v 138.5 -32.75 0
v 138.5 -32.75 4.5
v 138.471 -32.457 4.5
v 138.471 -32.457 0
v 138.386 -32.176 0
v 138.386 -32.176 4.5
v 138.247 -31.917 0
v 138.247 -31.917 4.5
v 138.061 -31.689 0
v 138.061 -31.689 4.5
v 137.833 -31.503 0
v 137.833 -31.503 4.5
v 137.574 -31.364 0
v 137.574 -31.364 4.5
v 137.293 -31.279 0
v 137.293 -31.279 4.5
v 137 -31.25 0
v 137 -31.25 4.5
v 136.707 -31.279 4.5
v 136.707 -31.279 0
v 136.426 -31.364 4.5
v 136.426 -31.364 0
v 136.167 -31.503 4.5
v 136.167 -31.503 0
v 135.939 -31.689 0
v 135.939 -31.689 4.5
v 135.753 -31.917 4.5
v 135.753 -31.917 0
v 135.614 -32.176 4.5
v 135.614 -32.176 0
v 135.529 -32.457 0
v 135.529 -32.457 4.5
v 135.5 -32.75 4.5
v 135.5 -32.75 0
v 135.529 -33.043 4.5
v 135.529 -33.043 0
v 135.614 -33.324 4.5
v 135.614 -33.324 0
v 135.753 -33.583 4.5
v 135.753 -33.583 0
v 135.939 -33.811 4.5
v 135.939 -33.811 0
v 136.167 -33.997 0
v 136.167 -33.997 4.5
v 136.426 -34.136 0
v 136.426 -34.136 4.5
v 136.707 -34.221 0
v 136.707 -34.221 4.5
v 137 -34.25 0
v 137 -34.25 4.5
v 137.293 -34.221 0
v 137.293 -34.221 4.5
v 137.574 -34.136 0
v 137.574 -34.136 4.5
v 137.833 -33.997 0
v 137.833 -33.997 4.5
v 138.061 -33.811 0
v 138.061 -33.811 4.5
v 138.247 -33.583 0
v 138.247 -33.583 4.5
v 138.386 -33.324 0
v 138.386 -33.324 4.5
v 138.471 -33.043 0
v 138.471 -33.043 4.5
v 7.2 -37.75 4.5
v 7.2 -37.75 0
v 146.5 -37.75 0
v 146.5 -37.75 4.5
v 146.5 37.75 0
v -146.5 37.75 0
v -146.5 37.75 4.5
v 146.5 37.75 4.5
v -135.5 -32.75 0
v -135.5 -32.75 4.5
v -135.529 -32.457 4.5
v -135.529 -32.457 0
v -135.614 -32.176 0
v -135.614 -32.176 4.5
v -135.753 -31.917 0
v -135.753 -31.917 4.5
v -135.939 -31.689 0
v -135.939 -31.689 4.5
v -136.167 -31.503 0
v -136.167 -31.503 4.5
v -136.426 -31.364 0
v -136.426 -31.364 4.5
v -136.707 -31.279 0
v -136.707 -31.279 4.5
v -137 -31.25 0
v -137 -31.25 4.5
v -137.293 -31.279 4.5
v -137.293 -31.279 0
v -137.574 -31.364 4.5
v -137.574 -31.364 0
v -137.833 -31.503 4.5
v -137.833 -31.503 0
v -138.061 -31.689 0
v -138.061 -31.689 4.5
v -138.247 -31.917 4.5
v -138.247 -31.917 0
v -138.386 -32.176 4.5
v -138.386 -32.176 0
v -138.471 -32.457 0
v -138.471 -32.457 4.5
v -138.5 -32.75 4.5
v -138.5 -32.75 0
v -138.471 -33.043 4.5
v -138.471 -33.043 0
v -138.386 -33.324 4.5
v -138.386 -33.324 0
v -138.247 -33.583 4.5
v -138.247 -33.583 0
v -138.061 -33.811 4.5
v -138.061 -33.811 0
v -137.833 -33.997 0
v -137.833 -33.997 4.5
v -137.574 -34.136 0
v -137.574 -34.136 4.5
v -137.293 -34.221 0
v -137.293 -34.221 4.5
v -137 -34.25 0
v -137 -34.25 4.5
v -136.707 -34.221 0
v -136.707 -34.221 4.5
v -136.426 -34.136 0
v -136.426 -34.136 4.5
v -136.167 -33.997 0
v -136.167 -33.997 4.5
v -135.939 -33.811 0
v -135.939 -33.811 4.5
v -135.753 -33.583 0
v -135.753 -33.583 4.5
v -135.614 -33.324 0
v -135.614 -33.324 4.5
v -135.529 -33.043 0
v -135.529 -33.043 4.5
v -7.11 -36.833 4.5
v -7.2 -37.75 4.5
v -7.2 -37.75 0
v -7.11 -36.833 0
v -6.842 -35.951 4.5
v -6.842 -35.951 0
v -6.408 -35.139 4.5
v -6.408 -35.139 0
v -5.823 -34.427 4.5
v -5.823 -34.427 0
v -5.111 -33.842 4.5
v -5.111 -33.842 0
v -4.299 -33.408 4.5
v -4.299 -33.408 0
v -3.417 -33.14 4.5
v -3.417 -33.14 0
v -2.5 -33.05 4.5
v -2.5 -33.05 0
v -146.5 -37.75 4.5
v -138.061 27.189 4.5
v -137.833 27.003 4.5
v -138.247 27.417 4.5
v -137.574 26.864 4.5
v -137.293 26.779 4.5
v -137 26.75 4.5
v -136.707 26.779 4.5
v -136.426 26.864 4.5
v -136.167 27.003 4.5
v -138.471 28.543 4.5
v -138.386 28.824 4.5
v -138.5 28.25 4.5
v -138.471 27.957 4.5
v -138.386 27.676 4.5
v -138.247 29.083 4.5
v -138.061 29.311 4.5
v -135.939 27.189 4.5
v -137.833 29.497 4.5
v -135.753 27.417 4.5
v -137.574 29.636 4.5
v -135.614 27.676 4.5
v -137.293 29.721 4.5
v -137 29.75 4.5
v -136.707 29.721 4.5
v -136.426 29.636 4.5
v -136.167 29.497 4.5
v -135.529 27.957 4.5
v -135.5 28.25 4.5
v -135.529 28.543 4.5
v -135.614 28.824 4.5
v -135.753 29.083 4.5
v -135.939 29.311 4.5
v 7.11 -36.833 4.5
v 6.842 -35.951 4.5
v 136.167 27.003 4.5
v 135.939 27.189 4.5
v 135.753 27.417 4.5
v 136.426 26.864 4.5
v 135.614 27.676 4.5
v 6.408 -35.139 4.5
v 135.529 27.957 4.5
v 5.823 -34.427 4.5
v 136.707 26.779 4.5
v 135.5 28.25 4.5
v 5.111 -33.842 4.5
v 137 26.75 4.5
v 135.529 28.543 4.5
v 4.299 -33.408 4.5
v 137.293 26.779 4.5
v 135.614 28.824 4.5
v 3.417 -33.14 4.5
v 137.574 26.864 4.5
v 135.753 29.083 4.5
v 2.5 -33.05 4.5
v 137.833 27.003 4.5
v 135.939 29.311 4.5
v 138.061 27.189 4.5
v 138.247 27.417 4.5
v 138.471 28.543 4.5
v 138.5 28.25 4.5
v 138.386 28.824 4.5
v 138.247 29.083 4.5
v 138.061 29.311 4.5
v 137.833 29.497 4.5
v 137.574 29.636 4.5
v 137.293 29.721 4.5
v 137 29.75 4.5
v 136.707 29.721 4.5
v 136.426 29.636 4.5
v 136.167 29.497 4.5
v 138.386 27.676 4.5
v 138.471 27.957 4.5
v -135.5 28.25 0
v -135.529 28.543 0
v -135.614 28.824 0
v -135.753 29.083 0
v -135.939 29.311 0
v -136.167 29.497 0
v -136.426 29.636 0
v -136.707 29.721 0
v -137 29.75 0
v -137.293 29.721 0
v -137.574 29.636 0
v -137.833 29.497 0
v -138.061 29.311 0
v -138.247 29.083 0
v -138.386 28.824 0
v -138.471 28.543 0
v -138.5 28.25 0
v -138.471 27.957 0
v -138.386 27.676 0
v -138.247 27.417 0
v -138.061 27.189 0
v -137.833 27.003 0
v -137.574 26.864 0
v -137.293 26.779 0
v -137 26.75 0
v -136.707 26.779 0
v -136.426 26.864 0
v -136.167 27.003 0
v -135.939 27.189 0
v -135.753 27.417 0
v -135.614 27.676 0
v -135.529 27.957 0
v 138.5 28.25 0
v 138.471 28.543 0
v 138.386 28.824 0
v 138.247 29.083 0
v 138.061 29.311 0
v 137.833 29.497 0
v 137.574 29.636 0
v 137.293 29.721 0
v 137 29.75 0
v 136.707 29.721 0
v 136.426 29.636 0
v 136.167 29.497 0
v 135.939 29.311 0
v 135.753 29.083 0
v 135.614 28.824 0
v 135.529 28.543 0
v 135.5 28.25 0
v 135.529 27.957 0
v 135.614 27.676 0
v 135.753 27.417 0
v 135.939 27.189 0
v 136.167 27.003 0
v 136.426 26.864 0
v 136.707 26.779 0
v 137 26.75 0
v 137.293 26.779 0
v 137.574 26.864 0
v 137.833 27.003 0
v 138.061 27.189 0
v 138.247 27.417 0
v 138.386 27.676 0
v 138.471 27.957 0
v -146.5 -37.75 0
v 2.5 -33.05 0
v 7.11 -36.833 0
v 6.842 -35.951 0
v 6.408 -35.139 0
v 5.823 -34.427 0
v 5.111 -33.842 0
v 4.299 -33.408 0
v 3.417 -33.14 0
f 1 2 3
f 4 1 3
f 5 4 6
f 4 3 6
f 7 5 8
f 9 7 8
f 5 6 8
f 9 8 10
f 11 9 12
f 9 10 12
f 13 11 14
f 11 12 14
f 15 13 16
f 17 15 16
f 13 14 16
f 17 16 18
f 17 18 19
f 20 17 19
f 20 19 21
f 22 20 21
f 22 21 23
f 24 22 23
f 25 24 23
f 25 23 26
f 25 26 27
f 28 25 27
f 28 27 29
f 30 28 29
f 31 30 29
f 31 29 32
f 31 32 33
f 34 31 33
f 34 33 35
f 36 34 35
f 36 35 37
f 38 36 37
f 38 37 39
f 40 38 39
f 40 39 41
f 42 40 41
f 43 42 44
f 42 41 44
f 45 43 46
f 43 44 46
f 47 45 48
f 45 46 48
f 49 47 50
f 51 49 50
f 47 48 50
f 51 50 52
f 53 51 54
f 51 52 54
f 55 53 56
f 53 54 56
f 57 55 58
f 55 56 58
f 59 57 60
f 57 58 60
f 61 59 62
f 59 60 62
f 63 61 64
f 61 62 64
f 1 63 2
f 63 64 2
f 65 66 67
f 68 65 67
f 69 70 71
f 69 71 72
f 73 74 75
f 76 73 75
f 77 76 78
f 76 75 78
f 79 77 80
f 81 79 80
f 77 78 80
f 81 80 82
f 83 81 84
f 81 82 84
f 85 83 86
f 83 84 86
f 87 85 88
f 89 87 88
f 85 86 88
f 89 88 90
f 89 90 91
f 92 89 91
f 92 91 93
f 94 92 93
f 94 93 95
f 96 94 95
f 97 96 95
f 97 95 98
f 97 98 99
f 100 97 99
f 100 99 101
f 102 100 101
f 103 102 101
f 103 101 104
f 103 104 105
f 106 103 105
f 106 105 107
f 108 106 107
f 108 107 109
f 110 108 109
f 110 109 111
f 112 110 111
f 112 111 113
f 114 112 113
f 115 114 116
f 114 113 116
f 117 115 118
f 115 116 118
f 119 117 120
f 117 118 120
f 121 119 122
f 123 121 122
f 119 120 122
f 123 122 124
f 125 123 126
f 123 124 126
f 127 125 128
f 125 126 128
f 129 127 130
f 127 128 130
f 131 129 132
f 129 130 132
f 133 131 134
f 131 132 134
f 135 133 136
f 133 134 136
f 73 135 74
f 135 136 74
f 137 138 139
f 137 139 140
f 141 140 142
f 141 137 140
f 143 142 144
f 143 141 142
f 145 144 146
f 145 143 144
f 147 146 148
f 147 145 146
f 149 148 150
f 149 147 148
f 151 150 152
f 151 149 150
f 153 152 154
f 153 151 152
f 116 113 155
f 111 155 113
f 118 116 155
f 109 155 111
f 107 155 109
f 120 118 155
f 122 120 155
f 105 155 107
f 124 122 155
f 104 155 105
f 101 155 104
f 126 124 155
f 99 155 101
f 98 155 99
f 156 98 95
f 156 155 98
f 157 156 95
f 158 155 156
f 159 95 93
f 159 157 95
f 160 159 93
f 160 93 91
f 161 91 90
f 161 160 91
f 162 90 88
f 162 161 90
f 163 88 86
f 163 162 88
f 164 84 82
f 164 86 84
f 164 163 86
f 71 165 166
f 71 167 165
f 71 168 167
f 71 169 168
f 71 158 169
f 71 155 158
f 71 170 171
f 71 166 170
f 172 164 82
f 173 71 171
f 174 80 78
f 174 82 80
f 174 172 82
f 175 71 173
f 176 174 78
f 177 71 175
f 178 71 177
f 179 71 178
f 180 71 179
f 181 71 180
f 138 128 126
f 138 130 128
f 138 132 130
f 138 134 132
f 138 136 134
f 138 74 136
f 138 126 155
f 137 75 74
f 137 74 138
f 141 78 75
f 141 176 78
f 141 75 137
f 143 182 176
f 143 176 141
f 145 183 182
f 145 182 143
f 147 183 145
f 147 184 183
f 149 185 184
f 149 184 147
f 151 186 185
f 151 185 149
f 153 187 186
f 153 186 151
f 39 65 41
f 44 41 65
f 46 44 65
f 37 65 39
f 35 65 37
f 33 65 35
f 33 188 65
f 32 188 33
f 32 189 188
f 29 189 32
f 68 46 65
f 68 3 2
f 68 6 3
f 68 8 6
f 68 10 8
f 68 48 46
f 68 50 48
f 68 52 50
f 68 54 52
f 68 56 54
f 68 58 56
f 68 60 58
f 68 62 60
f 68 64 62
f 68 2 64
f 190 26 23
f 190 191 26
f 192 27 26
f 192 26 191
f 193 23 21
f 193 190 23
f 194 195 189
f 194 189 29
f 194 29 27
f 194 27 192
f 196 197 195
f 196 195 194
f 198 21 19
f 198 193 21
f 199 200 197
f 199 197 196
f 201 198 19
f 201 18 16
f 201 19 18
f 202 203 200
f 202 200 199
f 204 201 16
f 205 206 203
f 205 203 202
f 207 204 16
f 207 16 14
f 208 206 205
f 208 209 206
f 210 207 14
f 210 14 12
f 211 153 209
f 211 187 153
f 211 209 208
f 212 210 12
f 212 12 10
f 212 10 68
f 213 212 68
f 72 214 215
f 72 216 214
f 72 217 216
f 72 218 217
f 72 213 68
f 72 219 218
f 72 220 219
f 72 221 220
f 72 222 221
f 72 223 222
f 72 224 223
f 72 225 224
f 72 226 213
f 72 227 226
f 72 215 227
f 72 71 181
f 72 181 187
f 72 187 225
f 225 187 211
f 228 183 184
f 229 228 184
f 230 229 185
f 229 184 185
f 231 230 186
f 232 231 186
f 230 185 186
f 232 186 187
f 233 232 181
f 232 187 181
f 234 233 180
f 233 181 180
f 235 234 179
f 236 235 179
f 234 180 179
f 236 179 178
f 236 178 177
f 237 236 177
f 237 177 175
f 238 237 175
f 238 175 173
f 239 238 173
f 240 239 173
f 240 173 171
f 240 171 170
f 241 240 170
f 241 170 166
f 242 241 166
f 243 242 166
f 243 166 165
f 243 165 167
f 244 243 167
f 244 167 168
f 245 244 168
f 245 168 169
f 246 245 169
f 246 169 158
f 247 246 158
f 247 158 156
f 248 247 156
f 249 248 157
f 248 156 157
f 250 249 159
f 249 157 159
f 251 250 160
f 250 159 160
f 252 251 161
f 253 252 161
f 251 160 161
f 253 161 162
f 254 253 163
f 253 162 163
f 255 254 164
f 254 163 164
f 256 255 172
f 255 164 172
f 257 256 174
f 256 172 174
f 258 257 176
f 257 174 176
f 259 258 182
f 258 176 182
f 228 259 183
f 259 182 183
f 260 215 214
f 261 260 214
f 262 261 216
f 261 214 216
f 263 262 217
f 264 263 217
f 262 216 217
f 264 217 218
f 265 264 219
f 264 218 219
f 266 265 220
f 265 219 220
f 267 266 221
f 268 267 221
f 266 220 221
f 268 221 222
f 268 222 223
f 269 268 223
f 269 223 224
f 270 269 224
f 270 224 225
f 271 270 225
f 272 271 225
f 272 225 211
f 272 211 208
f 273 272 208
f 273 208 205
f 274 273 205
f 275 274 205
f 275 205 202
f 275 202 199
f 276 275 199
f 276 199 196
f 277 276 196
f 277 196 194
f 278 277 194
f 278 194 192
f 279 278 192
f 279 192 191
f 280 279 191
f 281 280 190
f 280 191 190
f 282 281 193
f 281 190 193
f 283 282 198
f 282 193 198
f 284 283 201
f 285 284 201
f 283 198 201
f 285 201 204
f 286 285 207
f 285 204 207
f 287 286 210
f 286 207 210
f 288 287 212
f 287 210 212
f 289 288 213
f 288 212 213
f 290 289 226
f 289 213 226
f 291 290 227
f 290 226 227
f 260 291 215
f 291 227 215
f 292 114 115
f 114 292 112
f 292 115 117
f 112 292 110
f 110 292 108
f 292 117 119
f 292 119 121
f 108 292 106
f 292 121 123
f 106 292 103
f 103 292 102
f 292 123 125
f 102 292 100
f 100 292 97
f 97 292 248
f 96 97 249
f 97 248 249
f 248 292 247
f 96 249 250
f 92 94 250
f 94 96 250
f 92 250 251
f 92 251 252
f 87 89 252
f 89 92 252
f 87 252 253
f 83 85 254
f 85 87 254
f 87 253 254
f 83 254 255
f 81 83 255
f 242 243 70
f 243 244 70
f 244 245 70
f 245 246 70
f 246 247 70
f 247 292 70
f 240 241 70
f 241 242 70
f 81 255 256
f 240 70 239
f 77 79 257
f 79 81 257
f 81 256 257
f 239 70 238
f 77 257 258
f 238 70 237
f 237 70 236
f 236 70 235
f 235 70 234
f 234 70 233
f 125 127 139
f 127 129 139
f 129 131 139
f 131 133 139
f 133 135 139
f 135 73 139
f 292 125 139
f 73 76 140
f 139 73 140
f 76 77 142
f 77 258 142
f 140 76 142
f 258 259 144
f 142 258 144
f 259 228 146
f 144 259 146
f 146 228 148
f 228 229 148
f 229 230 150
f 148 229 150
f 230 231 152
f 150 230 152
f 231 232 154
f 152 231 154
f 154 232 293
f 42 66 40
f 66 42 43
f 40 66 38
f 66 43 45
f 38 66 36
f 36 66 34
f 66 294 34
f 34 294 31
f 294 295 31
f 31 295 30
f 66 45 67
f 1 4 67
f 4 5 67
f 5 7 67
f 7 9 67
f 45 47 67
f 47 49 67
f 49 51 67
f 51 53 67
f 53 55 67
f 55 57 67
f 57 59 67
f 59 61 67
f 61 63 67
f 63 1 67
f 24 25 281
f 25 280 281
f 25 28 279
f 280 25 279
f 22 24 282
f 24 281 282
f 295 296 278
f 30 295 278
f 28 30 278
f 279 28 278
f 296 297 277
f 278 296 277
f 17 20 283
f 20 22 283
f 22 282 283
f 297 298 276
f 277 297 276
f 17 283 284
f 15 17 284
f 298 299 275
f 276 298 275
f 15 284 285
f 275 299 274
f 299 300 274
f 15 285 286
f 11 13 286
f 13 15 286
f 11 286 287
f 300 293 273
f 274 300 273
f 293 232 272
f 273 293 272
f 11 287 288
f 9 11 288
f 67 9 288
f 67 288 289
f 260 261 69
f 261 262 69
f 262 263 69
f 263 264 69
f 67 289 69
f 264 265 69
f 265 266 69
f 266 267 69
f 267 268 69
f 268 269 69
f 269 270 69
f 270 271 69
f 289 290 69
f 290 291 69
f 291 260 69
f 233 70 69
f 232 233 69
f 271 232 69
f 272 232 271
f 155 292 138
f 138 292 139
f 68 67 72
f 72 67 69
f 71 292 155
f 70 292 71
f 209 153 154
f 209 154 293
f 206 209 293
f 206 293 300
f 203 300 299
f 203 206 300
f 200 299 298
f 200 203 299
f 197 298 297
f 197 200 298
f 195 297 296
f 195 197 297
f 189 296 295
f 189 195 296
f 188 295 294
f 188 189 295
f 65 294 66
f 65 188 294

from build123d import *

# Parameters (mm, degrees)
SKETCH1_W           = 293
SKETCH1_H           = 75.5
BOSS_EXTRUDE1_DEPTH = 4.5
CUT_EXTRUDE1_REACH  = 153.352
SKETCH2_R           = 1.5


with BuildPart() as part:
    # Sketch1 → Boss-Extrude1 (new body)
    with BuildSketch(Plane.XY):
        Rectangle(SKETCH1_W, SKETCH1_H)
    extrude(amount=BOSS_EXTRUDE1_DEPTH)

    # Sketch2 → Cut-Extrude1 (cut, up to next)
    with BuildSketch(Plane.XY.offset(4.5), mode=Mode.PRIVATE) as cut_extrude1_sk1:
        with Locations((137, 28.25)):
            Circle(SKETCH2_R)
    cut_extrude1_tool1 = extrude(cut_extrude1_sk1.sketch, amount=-CUT_EXTRUDE1_REACH, mode=Mode.PRIVATE) & part.part
    # Sketch2 → Cut-Extrude1 (cut, up to next)
    with BuildSketch(Plane.XY.offset(4.5), mode=Mode.PRIVATE) as cut_extrude1_sk2:
        with Locations((-137, 28.25)):
            Circle(SKETCH2_R)
    cut_extrude1_tool2 = extrude(cut_extrude1_sk2.sketch, amount=-CUT_EXTRUDE1_REACH, mode=Mode.PRIVATE) & part.part
    # Sketch2 → Cut-Extrude1 (cut, up to next)
    with BuildSketch(Plane.XY.offset(4.5), mode=Mode.PRIVATE) as cut_extrude1_sk3:
        with Locations((-137, -32.75)):
            Circle(SKETCH2_R)
    cut_extrude1_tool3 = extrude(cut_extrude1_sk3.sketch, amount=-CUT_EXTRUDE1_REACH, mode=Mode.PRIVATE) & part.part
    # Sketch2 → Cut-Extrude1 (cut, up to next)
    with BuildSketch(Plane.XY.offset(4.5), mode=Mode.PRIVATE) as cut_extrude1_sk4:
        with Locations((137, -32.75)):
            Circle(SKETCH2_R)
    cut_extrude1_tool4 = extrude(cut_extrude1_sk4.sketch, amount=-CUT_EXTRUDE1_REACH, mode=Mode.PRIVATE) & part.part
    # Sketch2 → Cut-Extrude1 (cut, up to next)
    with BuildSketch(Plane.XY.offset(4.5), mode=Mode.PRIVATE) as cut_extrude1_sk5:
        with BuildLine():
            Line((2.5, -42.449938401), (-2.5, -42.449938401))
            ThreePointArc((-2.5, -42.449938401), (-7.199938401, -37.75), (-2.5, -33.050061599))
            Line((-2.5, -33.050061599), (2.5, -33.050061599))
            ThreePointArc((2.5, -33.050061599), (7.199938401, -37.75), (2.5, -42.449938401))
        make_face()
    cut_extrude1_tool5 = extrude(cut_extrude1_sk5.sketch, amount=-CUT_EXTRUDE1_REACH, mode=Mode.PRIVATE) & part.part
    add(cut_extrude1_tool1.solids().sort_by_distance((137, 28.25, 4.5))[0], mode=Mode.SUBTRACT)
    add(cut_extrude1_tool2.solids().sort_by_distance((-137, 28.25, 4.5))[0], mode=Mode.SUBTRACT)
    add(cut_extrude1_tool3.solids().sort_by_distance((-137, -32.75, 4.5))[0], mode=Mode.SUBTRACT)
    add(cut_extrude1_tool4.solids().sort_by_distance((137, -32.75, 4.5))[0], mode=Mode.SUBTRACT)
    add(cut_extrude1_tool5.solids().sort_by_distance((0, -37.75, 4.5))[0], mode=Mode.SUBTRACT)


solid = part.part
